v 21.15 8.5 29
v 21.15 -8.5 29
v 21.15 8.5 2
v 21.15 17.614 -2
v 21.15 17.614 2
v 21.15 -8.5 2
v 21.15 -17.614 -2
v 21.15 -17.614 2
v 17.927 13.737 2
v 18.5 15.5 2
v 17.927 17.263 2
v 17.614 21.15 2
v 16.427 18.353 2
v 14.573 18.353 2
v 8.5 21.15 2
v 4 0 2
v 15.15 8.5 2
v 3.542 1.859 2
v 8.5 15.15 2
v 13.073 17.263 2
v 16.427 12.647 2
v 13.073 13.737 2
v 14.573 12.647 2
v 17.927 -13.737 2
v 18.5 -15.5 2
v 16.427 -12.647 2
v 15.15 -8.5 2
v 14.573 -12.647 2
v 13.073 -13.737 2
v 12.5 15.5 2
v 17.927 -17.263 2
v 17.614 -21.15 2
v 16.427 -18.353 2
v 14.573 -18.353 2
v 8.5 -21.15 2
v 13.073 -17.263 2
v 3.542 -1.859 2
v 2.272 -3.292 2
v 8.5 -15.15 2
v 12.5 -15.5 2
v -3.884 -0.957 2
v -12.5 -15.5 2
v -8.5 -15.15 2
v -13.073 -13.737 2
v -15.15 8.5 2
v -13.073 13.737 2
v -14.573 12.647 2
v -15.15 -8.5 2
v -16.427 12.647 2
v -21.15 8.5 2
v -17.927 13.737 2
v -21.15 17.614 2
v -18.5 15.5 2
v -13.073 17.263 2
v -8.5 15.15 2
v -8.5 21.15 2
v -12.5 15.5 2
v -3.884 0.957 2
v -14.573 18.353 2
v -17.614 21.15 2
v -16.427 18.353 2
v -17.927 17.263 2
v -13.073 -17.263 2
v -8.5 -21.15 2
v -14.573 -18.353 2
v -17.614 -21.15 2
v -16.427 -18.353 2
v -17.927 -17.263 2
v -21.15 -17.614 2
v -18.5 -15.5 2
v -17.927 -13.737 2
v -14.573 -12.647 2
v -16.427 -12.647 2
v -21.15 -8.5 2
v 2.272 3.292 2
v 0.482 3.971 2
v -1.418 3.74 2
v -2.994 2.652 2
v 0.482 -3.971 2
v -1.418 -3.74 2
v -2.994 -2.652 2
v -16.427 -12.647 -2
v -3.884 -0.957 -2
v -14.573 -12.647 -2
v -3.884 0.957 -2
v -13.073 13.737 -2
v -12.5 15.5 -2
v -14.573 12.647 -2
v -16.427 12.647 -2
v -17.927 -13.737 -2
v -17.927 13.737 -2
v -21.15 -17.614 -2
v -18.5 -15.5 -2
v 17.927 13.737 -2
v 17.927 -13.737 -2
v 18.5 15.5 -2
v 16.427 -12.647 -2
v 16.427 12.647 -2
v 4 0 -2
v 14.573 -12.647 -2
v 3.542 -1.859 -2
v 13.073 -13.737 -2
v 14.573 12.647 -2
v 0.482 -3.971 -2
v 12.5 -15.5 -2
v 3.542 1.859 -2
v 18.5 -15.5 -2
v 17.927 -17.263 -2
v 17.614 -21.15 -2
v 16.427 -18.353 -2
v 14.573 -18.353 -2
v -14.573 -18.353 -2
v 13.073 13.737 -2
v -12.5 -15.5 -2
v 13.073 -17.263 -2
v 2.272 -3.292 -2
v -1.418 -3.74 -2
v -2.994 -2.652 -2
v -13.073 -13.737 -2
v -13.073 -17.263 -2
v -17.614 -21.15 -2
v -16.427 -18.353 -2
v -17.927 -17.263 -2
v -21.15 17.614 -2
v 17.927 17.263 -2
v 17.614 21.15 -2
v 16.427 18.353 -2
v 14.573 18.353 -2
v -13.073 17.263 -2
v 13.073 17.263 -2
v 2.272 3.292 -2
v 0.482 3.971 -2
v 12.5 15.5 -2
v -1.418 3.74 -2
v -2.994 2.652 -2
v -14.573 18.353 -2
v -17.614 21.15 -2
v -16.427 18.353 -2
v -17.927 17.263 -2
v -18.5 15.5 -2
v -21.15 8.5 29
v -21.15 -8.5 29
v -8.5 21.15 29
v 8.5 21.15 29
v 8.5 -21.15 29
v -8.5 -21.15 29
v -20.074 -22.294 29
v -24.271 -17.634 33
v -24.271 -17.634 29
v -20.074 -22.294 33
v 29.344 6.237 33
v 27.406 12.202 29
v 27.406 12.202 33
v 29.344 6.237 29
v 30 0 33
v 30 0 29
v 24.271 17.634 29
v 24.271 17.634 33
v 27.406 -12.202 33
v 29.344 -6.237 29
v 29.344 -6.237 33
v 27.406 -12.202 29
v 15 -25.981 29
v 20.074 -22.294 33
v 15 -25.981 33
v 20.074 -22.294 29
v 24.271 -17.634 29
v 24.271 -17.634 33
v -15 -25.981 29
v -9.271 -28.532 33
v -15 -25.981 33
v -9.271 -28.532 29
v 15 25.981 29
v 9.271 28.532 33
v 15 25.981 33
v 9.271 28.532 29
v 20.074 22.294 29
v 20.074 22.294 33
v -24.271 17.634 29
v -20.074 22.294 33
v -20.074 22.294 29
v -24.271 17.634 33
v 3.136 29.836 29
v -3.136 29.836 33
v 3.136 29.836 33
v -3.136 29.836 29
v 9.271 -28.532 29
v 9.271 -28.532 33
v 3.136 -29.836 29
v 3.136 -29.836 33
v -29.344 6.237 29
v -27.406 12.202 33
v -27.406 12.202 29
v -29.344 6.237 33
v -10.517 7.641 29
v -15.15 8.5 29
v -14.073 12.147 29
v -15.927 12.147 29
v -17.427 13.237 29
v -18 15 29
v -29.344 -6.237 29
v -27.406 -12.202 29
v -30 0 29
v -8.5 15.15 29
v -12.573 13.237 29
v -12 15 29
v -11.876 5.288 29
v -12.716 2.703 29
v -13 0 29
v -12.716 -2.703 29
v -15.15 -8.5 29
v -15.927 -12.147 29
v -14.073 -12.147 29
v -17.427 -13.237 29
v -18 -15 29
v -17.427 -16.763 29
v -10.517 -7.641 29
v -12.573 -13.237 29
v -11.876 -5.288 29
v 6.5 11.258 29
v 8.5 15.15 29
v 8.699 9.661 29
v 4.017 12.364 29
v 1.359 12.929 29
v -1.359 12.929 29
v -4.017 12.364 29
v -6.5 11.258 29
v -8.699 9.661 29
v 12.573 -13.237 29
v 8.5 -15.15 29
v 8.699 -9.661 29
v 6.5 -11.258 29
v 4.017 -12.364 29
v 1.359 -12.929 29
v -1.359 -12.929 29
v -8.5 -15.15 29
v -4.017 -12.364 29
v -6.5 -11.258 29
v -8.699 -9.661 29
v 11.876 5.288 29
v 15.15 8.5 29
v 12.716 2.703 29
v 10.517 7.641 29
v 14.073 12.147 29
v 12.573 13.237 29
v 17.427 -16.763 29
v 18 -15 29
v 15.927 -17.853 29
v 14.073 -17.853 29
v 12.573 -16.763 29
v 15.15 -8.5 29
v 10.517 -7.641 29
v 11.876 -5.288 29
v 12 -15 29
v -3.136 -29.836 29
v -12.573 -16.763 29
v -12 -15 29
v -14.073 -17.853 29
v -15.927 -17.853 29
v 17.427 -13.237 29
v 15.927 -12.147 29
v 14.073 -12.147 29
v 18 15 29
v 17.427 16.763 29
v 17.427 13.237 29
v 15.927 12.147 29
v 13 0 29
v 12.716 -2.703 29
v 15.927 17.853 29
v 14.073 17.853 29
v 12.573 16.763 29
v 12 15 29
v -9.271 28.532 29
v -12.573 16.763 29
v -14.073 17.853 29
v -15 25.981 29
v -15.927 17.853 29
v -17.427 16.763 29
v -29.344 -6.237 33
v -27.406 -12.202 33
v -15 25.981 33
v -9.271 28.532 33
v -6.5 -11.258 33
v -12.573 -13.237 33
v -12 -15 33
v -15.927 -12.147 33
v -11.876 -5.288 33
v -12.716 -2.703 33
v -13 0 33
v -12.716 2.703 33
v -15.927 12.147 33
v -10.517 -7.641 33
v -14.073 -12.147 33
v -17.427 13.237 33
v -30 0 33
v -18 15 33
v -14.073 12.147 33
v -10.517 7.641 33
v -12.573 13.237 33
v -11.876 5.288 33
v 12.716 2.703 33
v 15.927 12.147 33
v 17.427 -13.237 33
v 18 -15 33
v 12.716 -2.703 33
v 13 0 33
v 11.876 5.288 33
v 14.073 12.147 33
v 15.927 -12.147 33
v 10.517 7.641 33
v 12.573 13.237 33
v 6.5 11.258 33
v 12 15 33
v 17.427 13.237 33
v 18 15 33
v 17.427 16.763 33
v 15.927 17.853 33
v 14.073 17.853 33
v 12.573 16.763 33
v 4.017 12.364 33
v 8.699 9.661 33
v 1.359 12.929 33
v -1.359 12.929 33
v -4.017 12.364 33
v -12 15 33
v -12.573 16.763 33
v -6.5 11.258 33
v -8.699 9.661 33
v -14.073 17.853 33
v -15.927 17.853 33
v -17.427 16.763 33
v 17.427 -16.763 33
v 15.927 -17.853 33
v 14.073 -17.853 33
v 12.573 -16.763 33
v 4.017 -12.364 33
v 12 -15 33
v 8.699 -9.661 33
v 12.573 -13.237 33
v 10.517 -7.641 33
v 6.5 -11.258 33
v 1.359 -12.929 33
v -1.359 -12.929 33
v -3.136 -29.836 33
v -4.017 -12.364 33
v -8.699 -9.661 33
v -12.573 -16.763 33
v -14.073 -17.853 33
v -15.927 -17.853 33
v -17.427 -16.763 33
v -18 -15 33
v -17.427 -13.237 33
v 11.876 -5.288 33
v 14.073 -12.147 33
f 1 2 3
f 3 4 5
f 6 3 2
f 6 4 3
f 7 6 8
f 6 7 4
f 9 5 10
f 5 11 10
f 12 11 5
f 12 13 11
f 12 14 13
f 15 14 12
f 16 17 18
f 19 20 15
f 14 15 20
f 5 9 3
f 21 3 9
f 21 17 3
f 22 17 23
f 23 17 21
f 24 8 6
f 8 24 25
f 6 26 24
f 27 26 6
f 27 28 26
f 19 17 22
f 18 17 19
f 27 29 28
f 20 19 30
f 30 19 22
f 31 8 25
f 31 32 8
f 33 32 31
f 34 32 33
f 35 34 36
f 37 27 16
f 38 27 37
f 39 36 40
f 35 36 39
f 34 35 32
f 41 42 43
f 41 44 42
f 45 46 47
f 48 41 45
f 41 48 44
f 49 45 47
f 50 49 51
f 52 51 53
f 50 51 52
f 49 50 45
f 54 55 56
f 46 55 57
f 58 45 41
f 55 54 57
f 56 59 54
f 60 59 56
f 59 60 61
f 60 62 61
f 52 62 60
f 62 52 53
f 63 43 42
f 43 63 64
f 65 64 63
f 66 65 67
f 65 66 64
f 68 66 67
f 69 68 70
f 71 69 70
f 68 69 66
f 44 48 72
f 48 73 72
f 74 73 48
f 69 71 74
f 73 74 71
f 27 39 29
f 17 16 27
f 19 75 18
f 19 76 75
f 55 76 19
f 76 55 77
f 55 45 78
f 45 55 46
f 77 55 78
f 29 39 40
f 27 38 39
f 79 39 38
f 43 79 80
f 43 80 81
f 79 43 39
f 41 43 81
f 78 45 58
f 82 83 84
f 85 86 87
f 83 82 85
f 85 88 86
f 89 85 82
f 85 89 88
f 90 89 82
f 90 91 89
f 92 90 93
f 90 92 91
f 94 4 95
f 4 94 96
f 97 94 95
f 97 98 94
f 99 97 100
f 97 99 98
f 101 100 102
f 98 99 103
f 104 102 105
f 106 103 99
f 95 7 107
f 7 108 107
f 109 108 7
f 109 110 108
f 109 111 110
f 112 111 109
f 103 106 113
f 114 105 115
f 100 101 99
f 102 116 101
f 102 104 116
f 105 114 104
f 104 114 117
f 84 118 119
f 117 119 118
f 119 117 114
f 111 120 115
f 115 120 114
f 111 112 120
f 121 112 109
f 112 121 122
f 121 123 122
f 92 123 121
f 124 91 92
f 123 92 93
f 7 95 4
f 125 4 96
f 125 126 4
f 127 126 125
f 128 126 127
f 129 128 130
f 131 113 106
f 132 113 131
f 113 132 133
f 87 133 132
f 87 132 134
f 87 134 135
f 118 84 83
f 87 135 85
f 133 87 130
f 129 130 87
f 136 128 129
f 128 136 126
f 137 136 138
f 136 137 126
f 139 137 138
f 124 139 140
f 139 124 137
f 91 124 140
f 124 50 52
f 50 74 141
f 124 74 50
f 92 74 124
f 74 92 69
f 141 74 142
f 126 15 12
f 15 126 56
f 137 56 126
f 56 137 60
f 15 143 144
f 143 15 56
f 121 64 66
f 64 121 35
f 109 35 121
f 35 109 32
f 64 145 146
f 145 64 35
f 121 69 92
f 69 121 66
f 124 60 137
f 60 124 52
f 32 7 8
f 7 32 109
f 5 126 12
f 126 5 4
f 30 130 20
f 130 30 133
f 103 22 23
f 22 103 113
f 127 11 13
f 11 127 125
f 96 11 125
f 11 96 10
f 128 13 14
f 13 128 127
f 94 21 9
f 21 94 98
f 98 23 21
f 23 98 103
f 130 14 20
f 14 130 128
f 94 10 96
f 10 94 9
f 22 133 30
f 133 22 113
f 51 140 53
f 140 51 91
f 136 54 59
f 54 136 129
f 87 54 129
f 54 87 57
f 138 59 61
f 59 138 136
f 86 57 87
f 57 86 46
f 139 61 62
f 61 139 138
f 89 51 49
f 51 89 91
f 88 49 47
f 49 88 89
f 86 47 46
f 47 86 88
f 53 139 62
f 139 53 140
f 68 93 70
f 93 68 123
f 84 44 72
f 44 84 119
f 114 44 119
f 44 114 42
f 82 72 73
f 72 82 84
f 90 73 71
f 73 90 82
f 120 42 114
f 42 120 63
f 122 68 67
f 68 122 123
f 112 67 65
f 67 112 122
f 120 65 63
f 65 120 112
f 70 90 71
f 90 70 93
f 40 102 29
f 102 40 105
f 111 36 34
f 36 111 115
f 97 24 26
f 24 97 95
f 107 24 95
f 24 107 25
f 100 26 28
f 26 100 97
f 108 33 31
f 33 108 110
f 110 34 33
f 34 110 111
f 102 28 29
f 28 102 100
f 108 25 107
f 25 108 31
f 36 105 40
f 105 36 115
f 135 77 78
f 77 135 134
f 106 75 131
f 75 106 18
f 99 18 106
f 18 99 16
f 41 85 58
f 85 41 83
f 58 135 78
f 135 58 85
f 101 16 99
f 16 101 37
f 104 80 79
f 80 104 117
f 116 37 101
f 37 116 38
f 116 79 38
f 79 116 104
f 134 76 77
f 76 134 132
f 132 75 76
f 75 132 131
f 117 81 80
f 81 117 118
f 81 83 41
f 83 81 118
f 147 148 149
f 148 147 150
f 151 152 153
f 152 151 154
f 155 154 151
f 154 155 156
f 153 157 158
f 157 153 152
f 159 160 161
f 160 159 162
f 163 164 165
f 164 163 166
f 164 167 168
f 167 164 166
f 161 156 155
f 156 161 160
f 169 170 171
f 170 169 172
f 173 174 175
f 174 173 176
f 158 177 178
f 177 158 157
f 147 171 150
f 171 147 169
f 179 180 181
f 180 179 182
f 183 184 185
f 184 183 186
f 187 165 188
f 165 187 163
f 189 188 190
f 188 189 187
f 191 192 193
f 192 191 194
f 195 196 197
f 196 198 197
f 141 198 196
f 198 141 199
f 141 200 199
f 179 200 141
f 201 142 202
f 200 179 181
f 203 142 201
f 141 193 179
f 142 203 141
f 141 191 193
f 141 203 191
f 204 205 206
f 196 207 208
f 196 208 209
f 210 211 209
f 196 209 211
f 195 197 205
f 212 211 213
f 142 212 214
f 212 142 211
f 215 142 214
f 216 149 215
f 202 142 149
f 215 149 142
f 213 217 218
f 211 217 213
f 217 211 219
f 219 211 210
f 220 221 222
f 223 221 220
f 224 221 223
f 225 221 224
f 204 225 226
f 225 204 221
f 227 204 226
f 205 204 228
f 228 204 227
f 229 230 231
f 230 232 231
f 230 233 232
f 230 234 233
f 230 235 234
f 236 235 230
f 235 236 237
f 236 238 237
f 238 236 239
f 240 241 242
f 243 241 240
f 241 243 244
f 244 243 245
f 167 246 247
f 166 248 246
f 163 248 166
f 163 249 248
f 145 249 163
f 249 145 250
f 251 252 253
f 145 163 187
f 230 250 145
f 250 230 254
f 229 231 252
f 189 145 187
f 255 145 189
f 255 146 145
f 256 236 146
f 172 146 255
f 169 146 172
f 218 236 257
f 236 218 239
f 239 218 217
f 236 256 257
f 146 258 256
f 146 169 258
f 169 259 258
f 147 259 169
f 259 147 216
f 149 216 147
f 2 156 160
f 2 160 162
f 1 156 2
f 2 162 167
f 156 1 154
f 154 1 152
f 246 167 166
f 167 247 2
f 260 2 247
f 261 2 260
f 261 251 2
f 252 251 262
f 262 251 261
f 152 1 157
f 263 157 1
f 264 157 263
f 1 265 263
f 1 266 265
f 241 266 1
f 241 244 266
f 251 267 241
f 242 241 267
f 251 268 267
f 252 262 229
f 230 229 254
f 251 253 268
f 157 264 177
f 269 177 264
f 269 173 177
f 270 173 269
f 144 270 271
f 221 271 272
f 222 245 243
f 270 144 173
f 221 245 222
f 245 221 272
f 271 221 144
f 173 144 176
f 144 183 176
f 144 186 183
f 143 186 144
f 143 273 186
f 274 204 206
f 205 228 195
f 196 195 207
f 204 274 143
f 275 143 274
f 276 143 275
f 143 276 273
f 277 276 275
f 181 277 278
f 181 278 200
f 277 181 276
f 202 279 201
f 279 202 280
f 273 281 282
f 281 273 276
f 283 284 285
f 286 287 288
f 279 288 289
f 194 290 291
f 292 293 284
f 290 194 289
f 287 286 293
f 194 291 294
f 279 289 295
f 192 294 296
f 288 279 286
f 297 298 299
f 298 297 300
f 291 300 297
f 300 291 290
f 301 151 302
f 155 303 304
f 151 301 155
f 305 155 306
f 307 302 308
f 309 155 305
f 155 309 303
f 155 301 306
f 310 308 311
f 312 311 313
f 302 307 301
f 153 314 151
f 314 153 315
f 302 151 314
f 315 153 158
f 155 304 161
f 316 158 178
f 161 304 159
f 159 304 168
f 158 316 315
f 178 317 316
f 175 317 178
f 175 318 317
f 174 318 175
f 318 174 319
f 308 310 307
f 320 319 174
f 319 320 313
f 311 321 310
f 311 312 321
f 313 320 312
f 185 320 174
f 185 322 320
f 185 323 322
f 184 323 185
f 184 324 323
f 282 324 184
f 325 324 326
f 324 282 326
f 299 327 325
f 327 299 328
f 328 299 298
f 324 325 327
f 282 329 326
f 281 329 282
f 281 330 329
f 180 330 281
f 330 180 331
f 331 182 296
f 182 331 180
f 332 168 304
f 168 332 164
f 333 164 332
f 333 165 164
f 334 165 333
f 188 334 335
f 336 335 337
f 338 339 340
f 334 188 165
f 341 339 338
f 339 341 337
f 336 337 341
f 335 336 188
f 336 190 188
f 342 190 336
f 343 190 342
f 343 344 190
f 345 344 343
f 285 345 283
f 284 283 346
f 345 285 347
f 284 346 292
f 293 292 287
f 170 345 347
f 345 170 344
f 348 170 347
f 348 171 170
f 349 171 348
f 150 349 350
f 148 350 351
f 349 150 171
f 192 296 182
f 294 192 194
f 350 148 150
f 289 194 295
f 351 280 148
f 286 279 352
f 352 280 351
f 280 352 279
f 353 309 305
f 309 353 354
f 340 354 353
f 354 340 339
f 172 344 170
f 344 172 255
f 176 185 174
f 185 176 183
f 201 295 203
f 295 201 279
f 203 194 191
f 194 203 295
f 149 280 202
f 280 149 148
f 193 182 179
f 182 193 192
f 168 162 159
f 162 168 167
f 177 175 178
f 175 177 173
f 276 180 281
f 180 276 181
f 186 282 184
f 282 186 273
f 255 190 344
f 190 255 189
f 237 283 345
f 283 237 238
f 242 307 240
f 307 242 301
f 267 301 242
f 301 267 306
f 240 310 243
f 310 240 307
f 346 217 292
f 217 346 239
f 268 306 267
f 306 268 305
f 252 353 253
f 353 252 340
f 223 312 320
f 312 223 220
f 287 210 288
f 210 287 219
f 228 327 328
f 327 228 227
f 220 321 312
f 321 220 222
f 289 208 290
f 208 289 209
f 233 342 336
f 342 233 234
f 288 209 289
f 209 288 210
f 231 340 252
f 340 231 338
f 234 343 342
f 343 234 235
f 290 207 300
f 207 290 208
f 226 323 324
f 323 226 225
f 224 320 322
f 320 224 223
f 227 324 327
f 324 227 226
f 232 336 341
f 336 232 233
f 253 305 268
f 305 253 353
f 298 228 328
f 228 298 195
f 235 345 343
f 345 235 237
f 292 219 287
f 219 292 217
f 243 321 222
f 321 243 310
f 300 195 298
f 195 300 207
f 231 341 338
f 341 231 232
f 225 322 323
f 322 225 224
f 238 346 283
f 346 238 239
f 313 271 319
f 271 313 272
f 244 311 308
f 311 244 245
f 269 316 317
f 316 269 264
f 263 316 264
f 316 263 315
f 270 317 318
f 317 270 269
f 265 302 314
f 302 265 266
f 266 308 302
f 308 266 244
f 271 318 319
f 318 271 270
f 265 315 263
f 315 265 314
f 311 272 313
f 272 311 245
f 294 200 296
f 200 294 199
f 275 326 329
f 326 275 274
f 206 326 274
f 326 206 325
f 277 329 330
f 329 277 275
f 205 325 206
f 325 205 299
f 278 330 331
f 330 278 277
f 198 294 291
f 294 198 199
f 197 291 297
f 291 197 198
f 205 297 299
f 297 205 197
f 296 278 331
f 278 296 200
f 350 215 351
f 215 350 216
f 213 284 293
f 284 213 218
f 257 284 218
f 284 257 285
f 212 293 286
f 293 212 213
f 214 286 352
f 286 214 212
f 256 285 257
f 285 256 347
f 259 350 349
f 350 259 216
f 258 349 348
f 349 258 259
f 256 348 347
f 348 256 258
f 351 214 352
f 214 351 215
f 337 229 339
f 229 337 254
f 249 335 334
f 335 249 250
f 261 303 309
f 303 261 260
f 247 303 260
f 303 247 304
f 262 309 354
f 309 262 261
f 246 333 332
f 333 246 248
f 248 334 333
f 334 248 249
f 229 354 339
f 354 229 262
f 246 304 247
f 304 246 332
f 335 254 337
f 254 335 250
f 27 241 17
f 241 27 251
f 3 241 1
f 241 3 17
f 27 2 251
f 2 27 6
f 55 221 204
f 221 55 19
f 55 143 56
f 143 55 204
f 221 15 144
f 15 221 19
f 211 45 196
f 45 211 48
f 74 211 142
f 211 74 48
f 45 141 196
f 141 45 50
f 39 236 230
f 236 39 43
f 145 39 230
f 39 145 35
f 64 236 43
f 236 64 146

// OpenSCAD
//// Díl k upevnění motoru k mikroskopu pro ovládání osy X

/// Parametry
h = 25;      // Výška válce spojky
d = 20;      // Vnější průměr spojky

  // U motoru
  m = 42.3;      // Strana čtverce u motoru
  hm = 4;      // Výška čtverce u motoru

  rm = 31;      //Rozteč děr na šrouby u motoru
  d1m = 6;     //Průměr děr na šrouby k motoru

  d2m = 8;    // Průměr otvoru na hřídel motoru

  // Příčky
  sp1 = 6;      //Šířka příček ve směru od středu
  sp2 = rm - 14; //Šířka příček kolmo na radiální směr
  
  // Upevnění k mikroskopu
  d1u = 60;    // Vnější průměr
  d2u = d + 6; // Vnitřní průměr
  hu = 4;      // Výška kotouče pro upevnění
  
  d3u = 6;      // Díry na šrouby
  ru = 30;      // Rozteč děr na šrouby
  
  
hc = h+hm+hu;     // Celková výška objektu

/// Spodní destička - u motoru

difference(){
  //Základní destička
  intersection() {
    cube([m, m, hm], center=true);
    
    rotate(45)
    cube([m*2/sqrt(2)-5, m*2/sqrt(2)-5, hm+2], center=true);
  } 
  
  //Díry na šrouby
  translate([rm/2, rm/2, 0])
  cylinder(hm+2, d1m/2, d1m/2, center=true);
  
  translate([-rm/2, rm/2, 0])
  cylinder(hm+2, d1m/2, d1m/2, center=true);
  
  translate([-rm/2, -rm/2, 0])
  cylinder(hm+2, d1m/2, d1m/2, center=true);
  
  translate([rm/2, -rm/2, 0])
  cylinder(hm+2, d1m/2, d1m/2, center=true);
  
  // Prostřední díra
  cylinder(hm+2, d2m/2, d2m/2, center=true);
  
}


/// Příčky vedoucí k mikroskopu

translate([m/2-sp1/2, 0, hc/2])
cube([sp1,sp2,hc], center=true);

rotate(90)
translate([m/2-sp1/2, 0, hc/2])
cube([sp1,sp2,hc], center=true);

rotate(180)
translate([m/2-sp1/2, 0, hc/2])
cube([sp1,sp2,hc], center=true);

rotate(270)
translate([m/2-sp1/2, 0, hc/2])
cube([sp1,sp2,hc], center=true);


/// Upevnění k mikroskopu

translate([0,0,hc-hu/2])
difference() {
    cylinder(hu, d1u/2, d1u/2, center=true);
    
  cylinder(hu+2, d2u/2, d2u/2, center=true);
    
  //Díry na šrouby
  translate([ru/2, ru/2, 0])
  cylinder(hu+2, d3u/2, d3u/2, center=true);
  
  translate([-ru/2, ru/2, 0])
  cylinder(hu+2, d3u/2, d3u/2, center=true);
  
  translate([-ru/2, -ru/2, 0])
  cylinder(hu+2, d3u/2, d3u/2, center=true);
  
  translate([ru/2, -ru/2, 0])
  cylinder(hu+2, d3u/2, d3u/2, center=true);
    
}
